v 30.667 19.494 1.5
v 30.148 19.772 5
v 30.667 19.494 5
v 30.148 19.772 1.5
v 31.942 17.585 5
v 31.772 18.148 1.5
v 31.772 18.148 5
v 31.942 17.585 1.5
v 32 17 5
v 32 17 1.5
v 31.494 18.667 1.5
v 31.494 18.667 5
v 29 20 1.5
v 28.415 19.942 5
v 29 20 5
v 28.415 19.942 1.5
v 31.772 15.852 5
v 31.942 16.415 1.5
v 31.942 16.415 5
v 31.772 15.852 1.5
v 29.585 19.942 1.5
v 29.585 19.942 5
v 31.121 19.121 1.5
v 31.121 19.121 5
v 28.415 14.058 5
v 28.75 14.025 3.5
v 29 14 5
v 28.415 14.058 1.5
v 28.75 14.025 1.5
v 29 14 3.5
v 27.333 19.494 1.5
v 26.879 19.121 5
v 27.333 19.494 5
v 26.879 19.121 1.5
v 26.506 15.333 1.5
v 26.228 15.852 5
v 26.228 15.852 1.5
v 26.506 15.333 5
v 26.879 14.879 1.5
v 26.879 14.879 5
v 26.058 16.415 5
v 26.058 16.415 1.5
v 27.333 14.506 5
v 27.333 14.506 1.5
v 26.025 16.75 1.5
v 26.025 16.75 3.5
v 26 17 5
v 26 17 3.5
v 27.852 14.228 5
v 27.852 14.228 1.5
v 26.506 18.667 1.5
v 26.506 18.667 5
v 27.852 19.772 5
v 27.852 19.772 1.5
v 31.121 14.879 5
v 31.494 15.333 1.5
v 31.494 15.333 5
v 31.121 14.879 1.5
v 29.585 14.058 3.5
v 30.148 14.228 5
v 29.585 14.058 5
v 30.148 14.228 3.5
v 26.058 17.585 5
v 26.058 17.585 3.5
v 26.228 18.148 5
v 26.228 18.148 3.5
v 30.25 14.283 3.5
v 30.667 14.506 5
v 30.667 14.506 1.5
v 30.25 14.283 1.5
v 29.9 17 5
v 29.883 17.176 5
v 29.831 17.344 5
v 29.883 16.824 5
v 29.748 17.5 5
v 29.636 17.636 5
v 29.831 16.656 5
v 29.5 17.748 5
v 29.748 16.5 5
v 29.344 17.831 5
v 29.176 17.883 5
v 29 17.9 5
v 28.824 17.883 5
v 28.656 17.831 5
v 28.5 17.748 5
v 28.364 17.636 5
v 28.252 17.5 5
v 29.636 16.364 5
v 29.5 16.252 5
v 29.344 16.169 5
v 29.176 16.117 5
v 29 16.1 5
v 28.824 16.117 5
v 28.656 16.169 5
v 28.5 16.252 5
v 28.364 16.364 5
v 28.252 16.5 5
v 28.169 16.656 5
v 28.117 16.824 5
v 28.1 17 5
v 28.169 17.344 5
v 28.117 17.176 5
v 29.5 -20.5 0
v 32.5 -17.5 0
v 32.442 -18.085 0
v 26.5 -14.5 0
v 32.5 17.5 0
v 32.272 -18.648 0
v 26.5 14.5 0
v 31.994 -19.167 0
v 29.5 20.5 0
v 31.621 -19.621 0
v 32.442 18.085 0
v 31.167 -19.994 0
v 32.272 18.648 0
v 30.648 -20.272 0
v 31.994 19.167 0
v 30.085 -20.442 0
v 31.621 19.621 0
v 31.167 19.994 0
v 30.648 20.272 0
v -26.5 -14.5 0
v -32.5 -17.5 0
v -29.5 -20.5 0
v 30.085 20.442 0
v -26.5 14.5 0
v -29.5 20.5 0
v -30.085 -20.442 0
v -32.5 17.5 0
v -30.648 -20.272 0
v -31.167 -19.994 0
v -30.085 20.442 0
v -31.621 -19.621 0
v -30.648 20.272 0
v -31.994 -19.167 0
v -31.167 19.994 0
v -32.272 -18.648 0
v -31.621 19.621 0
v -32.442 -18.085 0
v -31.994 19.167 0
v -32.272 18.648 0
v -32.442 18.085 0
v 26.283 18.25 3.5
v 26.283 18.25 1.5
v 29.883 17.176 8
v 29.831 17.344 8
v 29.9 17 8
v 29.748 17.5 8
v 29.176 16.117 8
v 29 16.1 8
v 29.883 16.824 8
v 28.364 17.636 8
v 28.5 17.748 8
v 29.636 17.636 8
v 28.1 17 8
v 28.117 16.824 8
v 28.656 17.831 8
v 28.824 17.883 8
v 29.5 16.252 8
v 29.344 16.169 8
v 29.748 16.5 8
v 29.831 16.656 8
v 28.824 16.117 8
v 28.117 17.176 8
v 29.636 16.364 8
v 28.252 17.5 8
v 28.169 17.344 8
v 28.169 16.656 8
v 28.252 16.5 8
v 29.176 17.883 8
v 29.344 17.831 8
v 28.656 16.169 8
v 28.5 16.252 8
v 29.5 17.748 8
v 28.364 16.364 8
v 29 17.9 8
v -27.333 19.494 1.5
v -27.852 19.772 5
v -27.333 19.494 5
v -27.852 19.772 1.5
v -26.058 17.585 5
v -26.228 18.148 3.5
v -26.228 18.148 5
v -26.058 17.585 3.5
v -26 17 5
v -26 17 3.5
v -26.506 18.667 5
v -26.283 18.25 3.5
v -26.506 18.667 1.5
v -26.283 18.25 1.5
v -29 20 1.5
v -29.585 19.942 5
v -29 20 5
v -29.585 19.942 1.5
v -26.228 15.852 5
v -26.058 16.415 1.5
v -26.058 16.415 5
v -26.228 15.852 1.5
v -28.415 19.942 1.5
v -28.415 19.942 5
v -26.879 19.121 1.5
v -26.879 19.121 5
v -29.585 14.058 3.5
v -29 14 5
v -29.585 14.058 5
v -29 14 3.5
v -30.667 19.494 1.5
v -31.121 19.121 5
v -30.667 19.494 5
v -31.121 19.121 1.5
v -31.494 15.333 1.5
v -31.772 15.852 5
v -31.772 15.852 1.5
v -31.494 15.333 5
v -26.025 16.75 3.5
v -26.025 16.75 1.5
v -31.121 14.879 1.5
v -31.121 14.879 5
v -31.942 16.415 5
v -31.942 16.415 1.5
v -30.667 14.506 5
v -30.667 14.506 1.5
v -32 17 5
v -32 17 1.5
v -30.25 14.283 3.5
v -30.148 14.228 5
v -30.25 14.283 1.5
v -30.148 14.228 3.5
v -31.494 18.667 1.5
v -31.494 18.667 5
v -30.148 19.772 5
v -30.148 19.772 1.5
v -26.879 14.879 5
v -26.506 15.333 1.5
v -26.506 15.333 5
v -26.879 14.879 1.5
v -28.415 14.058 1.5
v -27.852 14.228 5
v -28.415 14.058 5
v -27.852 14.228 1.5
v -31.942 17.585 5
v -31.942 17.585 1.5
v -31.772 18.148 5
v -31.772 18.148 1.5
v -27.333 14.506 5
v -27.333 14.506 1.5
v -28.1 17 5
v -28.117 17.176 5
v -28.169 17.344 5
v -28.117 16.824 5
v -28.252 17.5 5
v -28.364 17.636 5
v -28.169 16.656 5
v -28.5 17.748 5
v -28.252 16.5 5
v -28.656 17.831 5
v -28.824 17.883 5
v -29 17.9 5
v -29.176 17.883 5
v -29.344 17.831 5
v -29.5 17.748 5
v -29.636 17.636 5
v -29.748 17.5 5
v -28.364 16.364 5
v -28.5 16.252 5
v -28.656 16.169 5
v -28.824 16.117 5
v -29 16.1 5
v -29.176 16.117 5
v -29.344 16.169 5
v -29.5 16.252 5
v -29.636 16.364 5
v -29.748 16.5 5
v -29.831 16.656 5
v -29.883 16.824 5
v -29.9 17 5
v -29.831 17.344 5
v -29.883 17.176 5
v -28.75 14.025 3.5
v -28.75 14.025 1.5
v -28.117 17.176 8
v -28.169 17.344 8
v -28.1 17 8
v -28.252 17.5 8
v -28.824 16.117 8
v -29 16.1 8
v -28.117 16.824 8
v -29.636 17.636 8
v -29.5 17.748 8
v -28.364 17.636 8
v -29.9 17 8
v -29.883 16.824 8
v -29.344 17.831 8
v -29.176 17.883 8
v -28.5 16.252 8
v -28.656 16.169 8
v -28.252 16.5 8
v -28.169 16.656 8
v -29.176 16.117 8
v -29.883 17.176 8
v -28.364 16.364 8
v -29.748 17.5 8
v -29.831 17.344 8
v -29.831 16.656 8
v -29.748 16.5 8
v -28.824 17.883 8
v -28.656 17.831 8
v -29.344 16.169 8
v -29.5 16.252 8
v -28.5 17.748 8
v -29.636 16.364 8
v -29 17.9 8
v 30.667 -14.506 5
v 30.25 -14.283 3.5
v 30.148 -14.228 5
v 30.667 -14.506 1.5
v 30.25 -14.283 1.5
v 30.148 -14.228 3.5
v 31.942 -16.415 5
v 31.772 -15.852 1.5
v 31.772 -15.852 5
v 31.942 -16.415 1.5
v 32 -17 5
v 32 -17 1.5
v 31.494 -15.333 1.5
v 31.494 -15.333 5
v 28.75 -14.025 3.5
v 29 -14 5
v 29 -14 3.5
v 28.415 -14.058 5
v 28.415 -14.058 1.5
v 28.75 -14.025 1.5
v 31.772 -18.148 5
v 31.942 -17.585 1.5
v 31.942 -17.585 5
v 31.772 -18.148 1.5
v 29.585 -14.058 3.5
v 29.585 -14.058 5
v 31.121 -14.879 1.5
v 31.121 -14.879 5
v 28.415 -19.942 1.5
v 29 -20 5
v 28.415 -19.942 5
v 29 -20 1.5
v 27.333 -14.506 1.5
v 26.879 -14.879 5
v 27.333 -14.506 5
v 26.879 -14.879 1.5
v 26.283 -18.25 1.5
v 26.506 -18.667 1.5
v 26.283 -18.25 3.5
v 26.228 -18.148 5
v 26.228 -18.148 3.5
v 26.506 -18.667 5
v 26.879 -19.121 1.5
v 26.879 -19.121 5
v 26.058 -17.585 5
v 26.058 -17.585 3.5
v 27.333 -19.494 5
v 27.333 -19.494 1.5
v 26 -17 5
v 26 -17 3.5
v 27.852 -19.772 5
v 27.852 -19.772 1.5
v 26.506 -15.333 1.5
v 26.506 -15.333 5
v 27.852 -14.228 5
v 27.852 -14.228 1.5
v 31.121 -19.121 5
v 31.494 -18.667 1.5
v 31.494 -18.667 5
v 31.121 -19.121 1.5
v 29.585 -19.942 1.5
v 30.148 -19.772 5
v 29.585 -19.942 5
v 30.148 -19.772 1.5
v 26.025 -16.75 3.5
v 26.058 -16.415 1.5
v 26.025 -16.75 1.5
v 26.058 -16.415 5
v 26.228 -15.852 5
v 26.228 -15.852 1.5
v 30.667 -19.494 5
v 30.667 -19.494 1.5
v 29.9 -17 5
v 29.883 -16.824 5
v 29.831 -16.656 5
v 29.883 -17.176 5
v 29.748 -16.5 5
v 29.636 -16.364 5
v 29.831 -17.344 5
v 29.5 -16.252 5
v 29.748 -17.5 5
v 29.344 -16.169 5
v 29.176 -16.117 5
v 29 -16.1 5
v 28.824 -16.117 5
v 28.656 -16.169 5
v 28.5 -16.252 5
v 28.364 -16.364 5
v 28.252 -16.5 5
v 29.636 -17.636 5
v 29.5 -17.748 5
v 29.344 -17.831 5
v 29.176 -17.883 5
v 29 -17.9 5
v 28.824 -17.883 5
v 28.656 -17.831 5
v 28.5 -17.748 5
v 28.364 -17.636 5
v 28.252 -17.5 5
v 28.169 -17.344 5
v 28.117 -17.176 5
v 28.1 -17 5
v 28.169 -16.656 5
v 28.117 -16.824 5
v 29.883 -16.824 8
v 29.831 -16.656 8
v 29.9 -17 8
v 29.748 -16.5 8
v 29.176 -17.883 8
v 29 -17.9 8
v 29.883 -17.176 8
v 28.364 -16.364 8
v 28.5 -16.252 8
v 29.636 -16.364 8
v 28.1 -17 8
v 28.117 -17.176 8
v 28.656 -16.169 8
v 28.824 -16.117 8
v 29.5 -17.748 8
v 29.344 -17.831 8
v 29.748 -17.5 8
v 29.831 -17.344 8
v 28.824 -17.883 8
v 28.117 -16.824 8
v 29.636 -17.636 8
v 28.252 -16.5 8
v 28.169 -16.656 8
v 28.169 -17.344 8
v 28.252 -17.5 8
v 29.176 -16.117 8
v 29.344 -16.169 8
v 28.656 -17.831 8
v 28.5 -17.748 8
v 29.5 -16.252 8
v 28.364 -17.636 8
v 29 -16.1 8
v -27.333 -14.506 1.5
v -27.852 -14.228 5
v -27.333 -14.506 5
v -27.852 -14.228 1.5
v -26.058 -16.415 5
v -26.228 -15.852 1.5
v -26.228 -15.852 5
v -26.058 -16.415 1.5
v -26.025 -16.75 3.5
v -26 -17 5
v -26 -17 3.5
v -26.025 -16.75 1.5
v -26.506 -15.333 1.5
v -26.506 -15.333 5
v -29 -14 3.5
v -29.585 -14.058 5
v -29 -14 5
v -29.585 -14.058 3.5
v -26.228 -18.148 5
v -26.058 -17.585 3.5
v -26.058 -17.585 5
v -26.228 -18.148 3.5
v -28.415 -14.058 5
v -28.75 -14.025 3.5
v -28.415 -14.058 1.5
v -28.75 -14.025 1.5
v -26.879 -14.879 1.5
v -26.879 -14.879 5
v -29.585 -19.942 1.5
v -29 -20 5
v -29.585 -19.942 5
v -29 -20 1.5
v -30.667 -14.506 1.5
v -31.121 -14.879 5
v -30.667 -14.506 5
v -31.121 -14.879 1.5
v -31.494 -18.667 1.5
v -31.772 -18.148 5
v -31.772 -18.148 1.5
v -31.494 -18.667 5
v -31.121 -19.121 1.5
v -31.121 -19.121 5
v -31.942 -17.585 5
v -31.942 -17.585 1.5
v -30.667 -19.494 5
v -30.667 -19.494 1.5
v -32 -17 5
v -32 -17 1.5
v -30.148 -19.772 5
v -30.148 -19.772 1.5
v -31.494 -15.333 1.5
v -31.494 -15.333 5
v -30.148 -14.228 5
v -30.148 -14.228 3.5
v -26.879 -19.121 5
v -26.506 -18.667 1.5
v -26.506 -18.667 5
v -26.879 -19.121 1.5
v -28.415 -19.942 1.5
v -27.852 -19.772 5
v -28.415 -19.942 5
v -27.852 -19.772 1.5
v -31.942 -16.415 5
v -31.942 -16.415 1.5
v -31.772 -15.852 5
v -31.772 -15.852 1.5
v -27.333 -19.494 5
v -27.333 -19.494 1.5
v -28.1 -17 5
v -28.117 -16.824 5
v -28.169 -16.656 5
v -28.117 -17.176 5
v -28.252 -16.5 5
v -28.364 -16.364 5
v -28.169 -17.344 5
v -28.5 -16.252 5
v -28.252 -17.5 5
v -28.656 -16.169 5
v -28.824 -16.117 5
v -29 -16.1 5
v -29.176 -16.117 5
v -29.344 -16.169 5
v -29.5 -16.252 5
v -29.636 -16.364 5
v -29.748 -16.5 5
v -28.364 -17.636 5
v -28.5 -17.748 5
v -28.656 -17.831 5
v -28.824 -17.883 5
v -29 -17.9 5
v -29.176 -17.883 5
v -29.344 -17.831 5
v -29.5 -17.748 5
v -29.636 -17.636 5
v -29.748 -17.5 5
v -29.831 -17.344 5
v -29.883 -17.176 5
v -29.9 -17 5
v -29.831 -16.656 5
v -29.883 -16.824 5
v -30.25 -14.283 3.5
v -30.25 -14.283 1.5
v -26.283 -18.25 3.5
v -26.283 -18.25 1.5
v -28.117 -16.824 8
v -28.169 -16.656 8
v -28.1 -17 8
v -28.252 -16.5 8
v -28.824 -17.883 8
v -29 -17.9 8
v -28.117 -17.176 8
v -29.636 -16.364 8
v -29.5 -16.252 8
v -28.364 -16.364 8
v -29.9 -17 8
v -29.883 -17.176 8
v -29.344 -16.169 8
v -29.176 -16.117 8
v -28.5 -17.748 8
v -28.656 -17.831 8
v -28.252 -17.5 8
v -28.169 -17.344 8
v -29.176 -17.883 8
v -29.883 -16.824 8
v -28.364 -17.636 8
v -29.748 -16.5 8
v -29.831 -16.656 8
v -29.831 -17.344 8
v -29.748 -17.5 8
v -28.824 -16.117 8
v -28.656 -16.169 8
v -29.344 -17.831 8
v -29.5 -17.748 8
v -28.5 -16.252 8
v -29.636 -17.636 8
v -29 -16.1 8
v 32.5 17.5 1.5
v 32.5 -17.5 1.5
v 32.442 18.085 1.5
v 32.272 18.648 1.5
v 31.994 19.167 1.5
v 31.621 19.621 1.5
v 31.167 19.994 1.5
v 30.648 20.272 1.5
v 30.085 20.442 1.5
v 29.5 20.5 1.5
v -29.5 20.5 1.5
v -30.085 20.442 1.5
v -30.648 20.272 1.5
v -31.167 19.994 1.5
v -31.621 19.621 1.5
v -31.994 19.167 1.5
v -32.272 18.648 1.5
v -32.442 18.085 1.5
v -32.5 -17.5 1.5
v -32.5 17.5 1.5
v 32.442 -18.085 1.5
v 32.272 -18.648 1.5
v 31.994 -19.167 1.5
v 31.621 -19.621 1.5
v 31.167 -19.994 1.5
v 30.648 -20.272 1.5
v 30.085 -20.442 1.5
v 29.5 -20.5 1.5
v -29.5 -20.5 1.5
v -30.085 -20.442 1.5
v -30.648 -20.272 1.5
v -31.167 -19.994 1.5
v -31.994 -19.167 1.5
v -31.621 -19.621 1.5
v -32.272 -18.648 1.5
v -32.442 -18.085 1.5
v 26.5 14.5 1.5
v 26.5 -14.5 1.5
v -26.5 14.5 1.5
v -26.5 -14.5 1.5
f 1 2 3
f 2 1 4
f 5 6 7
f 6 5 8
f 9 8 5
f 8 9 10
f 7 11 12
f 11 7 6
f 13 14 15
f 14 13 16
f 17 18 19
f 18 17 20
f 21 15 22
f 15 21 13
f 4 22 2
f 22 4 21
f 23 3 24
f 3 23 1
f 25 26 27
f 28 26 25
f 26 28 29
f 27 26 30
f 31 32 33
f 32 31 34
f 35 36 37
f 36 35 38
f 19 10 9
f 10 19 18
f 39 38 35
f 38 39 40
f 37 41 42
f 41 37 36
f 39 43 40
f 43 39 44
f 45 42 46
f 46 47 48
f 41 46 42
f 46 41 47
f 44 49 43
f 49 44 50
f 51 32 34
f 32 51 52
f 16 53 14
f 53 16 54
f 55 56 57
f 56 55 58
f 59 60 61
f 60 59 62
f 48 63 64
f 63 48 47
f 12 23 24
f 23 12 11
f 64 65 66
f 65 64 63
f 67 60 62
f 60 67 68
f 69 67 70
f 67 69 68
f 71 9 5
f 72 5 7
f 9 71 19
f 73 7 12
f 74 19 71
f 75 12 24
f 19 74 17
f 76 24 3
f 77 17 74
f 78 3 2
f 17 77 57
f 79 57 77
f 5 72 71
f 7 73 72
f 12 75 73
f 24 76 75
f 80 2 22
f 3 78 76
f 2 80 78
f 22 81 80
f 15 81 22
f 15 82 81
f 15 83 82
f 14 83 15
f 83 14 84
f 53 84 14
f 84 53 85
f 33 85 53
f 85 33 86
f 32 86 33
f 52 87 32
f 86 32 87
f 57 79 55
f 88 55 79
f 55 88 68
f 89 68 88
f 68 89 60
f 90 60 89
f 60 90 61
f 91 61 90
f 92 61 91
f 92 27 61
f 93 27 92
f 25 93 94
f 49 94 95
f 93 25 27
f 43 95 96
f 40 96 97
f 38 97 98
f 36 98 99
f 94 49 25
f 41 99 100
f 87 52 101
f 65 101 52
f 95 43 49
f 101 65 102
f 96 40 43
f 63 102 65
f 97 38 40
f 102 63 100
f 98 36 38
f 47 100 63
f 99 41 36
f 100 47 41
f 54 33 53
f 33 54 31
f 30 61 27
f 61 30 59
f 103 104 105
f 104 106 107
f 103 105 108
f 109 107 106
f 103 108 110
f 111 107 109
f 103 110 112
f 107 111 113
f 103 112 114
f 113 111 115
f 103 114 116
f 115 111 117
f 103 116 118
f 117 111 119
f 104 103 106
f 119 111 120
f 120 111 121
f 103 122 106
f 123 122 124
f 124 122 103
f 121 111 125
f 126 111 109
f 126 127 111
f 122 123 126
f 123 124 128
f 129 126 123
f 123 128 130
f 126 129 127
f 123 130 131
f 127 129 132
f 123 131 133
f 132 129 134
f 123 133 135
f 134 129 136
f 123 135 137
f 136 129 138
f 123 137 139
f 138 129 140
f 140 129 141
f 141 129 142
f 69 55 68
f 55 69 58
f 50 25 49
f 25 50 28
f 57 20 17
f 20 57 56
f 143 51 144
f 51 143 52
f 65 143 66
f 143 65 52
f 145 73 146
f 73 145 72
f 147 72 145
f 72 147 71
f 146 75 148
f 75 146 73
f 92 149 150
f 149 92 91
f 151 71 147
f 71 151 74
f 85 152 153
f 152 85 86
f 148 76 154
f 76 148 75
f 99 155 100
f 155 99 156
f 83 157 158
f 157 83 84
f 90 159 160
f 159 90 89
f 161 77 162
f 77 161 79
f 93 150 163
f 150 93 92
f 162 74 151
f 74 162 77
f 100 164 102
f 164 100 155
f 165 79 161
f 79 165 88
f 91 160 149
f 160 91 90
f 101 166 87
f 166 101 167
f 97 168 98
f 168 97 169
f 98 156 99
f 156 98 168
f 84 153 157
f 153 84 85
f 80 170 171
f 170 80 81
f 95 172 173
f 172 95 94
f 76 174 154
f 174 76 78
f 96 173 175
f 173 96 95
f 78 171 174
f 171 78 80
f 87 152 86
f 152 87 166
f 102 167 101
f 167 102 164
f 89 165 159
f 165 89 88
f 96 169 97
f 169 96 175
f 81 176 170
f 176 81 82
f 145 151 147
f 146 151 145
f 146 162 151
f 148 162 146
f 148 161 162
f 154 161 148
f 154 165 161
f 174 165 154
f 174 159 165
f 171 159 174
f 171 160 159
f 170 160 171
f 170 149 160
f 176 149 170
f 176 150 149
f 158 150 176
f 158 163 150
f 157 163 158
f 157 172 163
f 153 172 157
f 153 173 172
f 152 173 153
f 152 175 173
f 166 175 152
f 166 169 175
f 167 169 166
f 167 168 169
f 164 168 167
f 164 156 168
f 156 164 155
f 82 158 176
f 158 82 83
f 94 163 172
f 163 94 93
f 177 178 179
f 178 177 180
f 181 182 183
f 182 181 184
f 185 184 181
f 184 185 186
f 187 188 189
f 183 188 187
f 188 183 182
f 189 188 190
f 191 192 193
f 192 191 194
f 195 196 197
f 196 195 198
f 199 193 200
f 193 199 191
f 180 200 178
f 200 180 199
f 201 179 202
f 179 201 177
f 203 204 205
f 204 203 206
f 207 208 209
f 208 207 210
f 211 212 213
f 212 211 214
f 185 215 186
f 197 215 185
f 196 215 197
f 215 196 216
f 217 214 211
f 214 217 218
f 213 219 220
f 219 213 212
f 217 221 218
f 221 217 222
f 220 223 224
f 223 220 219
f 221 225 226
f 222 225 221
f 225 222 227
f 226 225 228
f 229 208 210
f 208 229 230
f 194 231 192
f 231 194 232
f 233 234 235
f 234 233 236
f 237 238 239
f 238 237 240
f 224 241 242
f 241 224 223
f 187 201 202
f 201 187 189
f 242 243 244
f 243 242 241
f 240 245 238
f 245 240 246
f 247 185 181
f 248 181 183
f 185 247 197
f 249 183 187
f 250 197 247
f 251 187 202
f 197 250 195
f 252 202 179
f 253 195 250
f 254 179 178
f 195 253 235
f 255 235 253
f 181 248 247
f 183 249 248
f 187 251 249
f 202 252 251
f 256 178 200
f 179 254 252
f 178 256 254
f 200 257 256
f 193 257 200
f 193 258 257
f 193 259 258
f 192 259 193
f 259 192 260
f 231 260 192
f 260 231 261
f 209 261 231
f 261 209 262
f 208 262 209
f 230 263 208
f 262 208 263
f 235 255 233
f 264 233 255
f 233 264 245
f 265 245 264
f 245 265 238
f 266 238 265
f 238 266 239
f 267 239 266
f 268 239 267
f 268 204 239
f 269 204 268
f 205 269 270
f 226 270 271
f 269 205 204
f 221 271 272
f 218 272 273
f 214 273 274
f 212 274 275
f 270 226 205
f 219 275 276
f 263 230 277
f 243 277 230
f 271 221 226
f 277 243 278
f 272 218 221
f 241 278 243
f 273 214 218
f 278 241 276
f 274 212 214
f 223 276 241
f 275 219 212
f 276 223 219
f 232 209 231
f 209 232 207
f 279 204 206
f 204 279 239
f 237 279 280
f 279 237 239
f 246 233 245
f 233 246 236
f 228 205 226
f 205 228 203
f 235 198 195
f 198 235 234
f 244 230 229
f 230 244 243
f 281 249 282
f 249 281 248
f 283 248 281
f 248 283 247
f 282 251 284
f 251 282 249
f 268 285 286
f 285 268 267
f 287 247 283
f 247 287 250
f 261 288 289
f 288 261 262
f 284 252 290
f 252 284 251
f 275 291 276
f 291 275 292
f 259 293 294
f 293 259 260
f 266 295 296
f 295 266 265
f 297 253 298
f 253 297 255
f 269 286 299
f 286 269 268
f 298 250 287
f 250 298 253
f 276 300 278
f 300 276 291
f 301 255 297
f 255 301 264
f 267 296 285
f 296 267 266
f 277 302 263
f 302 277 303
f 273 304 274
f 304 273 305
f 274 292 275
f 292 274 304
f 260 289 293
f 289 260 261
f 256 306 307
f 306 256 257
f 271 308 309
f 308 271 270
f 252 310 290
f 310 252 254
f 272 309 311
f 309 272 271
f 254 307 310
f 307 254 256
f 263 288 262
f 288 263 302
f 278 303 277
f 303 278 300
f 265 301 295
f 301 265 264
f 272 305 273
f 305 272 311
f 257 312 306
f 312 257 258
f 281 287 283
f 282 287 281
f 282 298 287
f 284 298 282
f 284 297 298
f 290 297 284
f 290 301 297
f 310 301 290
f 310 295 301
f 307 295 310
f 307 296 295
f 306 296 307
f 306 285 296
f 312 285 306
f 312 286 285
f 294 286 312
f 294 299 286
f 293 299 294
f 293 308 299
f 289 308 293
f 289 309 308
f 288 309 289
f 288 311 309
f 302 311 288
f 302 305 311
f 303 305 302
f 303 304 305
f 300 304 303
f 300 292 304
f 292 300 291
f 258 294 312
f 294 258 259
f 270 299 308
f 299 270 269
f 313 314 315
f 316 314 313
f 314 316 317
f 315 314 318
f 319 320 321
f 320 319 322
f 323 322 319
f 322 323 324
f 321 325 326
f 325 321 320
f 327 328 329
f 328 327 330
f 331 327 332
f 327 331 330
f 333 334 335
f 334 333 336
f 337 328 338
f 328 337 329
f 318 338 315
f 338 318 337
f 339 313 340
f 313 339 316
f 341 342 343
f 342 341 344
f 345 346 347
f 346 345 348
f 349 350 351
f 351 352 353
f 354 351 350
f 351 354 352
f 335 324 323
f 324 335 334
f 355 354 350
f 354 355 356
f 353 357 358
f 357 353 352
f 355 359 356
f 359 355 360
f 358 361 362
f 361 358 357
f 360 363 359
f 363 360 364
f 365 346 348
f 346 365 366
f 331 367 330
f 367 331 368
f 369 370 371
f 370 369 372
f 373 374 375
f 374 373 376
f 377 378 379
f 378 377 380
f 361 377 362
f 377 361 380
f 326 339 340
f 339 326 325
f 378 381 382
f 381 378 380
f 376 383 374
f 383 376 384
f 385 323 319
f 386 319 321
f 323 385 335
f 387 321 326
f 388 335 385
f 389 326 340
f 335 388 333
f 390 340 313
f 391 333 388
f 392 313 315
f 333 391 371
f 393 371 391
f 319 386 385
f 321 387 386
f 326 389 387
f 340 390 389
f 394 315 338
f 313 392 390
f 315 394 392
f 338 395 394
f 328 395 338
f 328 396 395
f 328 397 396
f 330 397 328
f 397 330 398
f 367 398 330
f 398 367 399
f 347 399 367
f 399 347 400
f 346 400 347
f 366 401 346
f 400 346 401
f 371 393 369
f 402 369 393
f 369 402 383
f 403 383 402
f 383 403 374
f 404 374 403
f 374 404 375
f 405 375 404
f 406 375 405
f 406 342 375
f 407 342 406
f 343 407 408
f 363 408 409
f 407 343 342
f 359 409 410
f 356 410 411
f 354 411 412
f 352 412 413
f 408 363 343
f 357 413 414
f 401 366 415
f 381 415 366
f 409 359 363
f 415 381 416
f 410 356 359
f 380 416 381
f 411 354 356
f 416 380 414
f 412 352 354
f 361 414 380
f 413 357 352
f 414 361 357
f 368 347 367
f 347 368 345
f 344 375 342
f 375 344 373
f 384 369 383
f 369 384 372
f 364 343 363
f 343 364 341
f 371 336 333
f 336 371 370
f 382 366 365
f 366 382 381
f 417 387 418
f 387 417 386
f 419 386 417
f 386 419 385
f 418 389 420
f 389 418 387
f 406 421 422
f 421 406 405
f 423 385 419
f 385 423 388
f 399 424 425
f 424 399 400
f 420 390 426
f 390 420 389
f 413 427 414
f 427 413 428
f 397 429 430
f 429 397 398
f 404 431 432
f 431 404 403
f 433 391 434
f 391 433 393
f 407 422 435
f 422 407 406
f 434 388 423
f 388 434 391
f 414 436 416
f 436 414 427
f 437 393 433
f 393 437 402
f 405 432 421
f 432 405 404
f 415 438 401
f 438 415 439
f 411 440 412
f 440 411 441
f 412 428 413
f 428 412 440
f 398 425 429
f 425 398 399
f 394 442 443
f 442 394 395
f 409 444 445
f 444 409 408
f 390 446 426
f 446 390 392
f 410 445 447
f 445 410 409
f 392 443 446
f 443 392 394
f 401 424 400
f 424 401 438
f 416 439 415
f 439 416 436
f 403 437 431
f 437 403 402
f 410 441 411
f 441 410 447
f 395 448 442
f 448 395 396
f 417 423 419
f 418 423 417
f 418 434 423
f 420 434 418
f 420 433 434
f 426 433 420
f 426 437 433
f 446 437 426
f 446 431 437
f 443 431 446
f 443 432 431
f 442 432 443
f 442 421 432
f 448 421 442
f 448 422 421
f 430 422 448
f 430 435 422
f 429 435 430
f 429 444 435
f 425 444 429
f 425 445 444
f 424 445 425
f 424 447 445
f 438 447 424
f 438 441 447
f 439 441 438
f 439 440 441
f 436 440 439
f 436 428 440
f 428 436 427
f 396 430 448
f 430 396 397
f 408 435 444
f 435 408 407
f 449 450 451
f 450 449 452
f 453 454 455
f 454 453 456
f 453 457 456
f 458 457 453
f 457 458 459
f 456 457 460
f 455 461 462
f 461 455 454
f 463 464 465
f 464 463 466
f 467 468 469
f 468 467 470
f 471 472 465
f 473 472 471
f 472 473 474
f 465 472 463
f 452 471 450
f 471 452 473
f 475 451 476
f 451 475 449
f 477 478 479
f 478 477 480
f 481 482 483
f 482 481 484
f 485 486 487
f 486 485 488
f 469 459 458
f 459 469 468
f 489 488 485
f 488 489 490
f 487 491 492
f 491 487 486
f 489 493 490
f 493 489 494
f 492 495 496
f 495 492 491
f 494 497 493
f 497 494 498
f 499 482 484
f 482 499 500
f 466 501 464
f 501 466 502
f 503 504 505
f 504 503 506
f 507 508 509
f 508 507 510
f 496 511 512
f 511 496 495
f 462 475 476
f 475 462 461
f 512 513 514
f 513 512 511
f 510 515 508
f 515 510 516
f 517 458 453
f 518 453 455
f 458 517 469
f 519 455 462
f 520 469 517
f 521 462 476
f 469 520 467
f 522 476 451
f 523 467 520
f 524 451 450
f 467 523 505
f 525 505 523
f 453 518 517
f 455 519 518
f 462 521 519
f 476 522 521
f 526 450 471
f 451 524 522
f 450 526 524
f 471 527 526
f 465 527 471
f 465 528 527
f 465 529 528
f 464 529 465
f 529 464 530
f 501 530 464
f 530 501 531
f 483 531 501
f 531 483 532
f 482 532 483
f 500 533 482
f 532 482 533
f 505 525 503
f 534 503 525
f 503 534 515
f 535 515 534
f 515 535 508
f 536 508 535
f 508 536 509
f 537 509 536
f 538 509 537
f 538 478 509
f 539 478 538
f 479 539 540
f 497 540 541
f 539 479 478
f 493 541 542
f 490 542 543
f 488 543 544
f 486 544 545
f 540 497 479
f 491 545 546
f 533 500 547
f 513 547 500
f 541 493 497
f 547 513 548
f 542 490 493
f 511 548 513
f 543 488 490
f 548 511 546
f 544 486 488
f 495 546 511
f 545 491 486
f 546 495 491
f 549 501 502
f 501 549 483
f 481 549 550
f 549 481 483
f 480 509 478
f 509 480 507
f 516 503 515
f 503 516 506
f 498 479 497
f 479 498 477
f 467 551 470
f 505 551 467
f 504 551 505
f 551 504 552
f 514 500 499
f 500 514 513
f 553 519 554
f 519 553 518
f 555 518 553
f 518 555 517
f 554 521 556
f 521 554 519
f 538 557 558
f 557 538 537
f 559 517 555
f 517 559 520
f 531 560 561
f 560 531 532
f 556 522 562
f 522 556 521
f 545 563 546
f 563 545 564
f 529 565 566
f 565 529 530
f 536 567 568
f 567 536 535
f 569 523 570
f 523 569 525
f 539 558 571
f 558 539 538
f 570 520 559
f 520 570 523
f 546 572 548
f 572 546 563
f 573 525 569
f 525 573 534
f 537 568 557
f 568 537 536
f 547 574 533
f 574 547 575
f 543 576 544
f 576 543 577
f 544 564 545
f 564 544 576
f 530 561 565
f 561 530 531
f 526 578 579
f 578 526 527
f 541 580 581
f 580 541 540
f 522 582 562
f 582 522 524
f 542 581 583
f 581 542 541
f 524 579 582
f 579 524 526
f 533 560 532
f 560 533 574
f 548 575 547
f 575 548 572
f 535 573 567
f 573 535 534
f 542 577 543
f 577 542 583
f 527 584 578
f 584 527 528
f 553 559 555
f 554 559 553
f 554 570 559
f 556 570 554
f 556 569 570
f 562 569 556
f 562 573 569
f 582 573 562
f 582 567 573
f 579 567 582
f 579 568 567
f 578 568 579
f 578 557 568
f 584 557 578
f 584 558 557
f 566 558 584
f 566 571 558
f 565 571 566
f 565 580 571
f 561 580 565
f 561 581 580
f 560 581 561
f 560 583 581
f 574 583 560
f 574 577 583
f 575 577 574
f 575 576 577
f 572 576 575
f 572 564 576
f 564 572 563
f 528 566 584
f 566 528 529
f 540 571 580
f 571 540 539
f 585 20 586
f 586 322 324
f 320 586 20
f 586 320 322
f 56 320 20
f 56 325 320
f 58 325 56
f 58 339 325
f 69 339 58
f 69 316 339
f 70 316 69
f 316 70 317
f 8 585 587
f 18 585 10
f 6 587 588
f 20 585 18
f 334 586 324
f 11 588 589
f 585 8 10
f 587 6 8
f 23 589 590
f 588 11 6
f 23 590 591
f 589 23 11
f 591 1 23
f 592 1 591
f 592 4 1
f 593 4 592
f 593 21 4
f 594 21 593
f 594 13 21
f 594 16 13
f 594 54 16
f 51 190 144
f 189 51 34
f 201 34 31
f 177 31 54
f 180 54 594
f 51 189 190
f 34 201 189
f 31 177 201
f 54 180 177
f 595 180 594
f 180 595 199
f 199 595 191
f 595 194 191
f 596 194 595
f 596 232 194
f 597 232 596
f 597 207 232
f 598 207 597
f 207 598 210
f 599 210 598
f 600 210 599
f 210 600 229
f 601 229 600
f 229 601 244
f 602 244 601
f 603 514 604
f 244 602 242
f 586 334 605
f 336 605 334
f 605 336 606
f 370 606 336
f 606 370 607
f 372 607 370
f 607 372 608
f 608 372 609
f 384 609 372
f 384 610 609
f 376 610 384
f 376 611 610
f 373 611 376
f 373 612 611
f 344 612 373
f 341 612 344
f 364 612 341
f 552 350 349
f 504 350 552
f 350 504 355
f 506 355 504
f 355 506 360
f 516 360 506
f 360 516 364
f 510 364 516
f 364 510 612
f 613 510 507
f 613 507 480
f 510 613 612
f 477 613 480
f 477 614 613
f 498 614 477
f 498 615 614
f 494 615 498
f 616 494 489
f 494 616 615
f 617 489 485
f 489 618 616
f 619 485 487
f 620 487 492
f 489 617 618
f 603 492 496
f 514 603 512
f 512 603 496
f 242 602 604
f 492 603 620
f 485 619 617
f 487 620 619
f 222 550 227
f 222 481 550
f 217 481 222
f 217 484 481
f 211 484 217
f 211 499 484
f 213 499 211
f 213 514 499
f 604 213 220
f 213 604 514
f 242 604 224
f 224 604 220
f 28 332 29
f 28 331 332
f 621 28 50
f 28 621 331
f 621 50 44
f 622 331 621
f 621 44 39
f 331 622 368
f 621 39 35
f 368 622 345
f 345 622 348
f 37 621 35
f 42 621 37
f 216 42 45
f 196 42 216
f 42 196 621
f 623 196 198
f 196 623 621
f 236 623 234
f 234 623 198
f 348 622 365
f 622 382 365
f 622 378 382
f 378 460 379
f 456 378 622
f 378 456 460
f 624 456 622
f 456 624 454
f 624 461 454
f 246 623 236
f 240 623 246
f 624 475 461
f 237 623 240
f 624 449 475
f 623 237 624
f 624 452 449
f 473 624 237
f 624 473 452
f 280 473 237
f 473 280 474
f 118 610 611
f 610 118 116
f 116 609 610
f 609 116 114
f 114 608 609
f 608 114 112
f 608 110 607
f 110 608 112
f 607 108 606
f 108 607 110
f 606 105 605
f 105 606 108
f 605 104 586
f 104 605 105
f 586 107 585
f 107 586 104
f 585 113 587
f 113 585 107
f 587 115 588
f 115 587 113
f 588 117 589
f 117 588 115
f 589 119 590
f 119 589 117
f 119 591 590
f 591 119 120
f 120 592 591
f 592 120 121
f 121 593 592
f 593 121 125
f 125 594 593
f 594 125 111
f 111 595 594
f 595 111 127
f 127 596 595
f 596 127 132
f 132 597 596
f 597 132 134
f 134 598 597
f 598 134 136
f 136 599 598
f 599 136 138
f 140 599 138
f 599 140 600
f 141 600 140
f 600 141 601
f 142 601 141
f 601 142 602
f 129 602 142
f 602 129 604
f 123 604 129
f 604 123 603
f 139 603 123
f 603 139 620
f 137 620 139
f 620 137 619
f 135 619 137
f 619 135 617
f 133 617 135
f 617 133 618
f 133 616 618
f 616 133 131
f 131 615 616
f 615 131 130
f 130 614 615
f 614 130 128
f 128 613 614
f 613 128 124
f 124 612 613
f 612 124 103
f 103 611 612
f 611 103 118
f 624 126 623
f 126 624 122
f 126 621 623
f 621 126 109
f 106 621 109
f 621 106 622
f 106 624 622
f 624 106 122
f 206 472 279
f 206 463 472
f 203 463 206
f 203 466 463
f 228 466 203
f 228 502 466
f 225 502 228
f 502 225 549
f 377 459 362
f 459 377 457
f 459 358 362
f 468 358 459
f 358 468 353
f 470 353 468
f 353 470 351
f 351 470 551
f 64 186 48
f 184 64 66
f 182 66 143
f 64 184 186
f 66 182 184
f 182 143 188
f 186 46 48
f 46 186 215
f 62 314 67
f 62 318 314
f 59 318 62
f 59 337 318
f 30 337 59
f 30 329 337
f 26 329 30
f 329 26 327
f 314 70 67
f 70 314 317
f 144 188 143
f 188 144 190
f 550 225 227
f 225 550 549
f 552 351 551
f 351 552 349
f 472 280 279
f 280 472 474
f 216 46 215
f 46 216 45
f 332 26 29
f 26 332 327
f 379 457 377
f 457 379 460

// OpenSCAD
// base frame
frame_thickness = 1.5;
frame_width = 6;

// reinforcement on base frame
frame_reinforcement_thickness = 1.5;
frame_reinforcement_width = 1.5;

// pillars to add a board
pillar_diameter = frame_width;
pillar_height = 5;

// pins to attach the board
pin_diameter = 1.8;
pin_height = 3;

module frame_border(size) {
	square([size[0] + 1, size[1] + 1], center=true);
}

module frame_outline(size, width) {
	difference() {
		offset(r=width / 2, $fn=32) {
			frame_border(size);
		}

		offset(r=-width / 2, $fn=32) {
			frame_border(size);
		}
	}
}

module pillar() {
	cylinder(d=pillar_diameter, h=pillar_height, $fn=32);

	translate([0, 0, pillar_height]) {
		cylinder(d=pin_diameter, h=pin_height, $fn=32);
	}
}

module pillars(size) {
	x = size[0];
	y = size[1];

	translate([x / 2, y / 2, 0]) {
		pillar();
	}

	translate([-(x / 2), y / 2, 0]) {
		pillar();
	}

	translate([x / 2, -(y / 2), 0]) {
		pillar();
	}

	translate([-(x / 2), -(y / 2), 0]) {
		pillar();
	}
}

module frame(size) {
	pillars(size);

	linear_extrude(frame_thickness) {
		frame_outline(size, frame_width);
	}
	linear_extrude(pillar_height - frame_reinforcement_thickness) {
		frame_outline(size, frame_reinforcement_width);
	}
}

frame([58, 34]);
